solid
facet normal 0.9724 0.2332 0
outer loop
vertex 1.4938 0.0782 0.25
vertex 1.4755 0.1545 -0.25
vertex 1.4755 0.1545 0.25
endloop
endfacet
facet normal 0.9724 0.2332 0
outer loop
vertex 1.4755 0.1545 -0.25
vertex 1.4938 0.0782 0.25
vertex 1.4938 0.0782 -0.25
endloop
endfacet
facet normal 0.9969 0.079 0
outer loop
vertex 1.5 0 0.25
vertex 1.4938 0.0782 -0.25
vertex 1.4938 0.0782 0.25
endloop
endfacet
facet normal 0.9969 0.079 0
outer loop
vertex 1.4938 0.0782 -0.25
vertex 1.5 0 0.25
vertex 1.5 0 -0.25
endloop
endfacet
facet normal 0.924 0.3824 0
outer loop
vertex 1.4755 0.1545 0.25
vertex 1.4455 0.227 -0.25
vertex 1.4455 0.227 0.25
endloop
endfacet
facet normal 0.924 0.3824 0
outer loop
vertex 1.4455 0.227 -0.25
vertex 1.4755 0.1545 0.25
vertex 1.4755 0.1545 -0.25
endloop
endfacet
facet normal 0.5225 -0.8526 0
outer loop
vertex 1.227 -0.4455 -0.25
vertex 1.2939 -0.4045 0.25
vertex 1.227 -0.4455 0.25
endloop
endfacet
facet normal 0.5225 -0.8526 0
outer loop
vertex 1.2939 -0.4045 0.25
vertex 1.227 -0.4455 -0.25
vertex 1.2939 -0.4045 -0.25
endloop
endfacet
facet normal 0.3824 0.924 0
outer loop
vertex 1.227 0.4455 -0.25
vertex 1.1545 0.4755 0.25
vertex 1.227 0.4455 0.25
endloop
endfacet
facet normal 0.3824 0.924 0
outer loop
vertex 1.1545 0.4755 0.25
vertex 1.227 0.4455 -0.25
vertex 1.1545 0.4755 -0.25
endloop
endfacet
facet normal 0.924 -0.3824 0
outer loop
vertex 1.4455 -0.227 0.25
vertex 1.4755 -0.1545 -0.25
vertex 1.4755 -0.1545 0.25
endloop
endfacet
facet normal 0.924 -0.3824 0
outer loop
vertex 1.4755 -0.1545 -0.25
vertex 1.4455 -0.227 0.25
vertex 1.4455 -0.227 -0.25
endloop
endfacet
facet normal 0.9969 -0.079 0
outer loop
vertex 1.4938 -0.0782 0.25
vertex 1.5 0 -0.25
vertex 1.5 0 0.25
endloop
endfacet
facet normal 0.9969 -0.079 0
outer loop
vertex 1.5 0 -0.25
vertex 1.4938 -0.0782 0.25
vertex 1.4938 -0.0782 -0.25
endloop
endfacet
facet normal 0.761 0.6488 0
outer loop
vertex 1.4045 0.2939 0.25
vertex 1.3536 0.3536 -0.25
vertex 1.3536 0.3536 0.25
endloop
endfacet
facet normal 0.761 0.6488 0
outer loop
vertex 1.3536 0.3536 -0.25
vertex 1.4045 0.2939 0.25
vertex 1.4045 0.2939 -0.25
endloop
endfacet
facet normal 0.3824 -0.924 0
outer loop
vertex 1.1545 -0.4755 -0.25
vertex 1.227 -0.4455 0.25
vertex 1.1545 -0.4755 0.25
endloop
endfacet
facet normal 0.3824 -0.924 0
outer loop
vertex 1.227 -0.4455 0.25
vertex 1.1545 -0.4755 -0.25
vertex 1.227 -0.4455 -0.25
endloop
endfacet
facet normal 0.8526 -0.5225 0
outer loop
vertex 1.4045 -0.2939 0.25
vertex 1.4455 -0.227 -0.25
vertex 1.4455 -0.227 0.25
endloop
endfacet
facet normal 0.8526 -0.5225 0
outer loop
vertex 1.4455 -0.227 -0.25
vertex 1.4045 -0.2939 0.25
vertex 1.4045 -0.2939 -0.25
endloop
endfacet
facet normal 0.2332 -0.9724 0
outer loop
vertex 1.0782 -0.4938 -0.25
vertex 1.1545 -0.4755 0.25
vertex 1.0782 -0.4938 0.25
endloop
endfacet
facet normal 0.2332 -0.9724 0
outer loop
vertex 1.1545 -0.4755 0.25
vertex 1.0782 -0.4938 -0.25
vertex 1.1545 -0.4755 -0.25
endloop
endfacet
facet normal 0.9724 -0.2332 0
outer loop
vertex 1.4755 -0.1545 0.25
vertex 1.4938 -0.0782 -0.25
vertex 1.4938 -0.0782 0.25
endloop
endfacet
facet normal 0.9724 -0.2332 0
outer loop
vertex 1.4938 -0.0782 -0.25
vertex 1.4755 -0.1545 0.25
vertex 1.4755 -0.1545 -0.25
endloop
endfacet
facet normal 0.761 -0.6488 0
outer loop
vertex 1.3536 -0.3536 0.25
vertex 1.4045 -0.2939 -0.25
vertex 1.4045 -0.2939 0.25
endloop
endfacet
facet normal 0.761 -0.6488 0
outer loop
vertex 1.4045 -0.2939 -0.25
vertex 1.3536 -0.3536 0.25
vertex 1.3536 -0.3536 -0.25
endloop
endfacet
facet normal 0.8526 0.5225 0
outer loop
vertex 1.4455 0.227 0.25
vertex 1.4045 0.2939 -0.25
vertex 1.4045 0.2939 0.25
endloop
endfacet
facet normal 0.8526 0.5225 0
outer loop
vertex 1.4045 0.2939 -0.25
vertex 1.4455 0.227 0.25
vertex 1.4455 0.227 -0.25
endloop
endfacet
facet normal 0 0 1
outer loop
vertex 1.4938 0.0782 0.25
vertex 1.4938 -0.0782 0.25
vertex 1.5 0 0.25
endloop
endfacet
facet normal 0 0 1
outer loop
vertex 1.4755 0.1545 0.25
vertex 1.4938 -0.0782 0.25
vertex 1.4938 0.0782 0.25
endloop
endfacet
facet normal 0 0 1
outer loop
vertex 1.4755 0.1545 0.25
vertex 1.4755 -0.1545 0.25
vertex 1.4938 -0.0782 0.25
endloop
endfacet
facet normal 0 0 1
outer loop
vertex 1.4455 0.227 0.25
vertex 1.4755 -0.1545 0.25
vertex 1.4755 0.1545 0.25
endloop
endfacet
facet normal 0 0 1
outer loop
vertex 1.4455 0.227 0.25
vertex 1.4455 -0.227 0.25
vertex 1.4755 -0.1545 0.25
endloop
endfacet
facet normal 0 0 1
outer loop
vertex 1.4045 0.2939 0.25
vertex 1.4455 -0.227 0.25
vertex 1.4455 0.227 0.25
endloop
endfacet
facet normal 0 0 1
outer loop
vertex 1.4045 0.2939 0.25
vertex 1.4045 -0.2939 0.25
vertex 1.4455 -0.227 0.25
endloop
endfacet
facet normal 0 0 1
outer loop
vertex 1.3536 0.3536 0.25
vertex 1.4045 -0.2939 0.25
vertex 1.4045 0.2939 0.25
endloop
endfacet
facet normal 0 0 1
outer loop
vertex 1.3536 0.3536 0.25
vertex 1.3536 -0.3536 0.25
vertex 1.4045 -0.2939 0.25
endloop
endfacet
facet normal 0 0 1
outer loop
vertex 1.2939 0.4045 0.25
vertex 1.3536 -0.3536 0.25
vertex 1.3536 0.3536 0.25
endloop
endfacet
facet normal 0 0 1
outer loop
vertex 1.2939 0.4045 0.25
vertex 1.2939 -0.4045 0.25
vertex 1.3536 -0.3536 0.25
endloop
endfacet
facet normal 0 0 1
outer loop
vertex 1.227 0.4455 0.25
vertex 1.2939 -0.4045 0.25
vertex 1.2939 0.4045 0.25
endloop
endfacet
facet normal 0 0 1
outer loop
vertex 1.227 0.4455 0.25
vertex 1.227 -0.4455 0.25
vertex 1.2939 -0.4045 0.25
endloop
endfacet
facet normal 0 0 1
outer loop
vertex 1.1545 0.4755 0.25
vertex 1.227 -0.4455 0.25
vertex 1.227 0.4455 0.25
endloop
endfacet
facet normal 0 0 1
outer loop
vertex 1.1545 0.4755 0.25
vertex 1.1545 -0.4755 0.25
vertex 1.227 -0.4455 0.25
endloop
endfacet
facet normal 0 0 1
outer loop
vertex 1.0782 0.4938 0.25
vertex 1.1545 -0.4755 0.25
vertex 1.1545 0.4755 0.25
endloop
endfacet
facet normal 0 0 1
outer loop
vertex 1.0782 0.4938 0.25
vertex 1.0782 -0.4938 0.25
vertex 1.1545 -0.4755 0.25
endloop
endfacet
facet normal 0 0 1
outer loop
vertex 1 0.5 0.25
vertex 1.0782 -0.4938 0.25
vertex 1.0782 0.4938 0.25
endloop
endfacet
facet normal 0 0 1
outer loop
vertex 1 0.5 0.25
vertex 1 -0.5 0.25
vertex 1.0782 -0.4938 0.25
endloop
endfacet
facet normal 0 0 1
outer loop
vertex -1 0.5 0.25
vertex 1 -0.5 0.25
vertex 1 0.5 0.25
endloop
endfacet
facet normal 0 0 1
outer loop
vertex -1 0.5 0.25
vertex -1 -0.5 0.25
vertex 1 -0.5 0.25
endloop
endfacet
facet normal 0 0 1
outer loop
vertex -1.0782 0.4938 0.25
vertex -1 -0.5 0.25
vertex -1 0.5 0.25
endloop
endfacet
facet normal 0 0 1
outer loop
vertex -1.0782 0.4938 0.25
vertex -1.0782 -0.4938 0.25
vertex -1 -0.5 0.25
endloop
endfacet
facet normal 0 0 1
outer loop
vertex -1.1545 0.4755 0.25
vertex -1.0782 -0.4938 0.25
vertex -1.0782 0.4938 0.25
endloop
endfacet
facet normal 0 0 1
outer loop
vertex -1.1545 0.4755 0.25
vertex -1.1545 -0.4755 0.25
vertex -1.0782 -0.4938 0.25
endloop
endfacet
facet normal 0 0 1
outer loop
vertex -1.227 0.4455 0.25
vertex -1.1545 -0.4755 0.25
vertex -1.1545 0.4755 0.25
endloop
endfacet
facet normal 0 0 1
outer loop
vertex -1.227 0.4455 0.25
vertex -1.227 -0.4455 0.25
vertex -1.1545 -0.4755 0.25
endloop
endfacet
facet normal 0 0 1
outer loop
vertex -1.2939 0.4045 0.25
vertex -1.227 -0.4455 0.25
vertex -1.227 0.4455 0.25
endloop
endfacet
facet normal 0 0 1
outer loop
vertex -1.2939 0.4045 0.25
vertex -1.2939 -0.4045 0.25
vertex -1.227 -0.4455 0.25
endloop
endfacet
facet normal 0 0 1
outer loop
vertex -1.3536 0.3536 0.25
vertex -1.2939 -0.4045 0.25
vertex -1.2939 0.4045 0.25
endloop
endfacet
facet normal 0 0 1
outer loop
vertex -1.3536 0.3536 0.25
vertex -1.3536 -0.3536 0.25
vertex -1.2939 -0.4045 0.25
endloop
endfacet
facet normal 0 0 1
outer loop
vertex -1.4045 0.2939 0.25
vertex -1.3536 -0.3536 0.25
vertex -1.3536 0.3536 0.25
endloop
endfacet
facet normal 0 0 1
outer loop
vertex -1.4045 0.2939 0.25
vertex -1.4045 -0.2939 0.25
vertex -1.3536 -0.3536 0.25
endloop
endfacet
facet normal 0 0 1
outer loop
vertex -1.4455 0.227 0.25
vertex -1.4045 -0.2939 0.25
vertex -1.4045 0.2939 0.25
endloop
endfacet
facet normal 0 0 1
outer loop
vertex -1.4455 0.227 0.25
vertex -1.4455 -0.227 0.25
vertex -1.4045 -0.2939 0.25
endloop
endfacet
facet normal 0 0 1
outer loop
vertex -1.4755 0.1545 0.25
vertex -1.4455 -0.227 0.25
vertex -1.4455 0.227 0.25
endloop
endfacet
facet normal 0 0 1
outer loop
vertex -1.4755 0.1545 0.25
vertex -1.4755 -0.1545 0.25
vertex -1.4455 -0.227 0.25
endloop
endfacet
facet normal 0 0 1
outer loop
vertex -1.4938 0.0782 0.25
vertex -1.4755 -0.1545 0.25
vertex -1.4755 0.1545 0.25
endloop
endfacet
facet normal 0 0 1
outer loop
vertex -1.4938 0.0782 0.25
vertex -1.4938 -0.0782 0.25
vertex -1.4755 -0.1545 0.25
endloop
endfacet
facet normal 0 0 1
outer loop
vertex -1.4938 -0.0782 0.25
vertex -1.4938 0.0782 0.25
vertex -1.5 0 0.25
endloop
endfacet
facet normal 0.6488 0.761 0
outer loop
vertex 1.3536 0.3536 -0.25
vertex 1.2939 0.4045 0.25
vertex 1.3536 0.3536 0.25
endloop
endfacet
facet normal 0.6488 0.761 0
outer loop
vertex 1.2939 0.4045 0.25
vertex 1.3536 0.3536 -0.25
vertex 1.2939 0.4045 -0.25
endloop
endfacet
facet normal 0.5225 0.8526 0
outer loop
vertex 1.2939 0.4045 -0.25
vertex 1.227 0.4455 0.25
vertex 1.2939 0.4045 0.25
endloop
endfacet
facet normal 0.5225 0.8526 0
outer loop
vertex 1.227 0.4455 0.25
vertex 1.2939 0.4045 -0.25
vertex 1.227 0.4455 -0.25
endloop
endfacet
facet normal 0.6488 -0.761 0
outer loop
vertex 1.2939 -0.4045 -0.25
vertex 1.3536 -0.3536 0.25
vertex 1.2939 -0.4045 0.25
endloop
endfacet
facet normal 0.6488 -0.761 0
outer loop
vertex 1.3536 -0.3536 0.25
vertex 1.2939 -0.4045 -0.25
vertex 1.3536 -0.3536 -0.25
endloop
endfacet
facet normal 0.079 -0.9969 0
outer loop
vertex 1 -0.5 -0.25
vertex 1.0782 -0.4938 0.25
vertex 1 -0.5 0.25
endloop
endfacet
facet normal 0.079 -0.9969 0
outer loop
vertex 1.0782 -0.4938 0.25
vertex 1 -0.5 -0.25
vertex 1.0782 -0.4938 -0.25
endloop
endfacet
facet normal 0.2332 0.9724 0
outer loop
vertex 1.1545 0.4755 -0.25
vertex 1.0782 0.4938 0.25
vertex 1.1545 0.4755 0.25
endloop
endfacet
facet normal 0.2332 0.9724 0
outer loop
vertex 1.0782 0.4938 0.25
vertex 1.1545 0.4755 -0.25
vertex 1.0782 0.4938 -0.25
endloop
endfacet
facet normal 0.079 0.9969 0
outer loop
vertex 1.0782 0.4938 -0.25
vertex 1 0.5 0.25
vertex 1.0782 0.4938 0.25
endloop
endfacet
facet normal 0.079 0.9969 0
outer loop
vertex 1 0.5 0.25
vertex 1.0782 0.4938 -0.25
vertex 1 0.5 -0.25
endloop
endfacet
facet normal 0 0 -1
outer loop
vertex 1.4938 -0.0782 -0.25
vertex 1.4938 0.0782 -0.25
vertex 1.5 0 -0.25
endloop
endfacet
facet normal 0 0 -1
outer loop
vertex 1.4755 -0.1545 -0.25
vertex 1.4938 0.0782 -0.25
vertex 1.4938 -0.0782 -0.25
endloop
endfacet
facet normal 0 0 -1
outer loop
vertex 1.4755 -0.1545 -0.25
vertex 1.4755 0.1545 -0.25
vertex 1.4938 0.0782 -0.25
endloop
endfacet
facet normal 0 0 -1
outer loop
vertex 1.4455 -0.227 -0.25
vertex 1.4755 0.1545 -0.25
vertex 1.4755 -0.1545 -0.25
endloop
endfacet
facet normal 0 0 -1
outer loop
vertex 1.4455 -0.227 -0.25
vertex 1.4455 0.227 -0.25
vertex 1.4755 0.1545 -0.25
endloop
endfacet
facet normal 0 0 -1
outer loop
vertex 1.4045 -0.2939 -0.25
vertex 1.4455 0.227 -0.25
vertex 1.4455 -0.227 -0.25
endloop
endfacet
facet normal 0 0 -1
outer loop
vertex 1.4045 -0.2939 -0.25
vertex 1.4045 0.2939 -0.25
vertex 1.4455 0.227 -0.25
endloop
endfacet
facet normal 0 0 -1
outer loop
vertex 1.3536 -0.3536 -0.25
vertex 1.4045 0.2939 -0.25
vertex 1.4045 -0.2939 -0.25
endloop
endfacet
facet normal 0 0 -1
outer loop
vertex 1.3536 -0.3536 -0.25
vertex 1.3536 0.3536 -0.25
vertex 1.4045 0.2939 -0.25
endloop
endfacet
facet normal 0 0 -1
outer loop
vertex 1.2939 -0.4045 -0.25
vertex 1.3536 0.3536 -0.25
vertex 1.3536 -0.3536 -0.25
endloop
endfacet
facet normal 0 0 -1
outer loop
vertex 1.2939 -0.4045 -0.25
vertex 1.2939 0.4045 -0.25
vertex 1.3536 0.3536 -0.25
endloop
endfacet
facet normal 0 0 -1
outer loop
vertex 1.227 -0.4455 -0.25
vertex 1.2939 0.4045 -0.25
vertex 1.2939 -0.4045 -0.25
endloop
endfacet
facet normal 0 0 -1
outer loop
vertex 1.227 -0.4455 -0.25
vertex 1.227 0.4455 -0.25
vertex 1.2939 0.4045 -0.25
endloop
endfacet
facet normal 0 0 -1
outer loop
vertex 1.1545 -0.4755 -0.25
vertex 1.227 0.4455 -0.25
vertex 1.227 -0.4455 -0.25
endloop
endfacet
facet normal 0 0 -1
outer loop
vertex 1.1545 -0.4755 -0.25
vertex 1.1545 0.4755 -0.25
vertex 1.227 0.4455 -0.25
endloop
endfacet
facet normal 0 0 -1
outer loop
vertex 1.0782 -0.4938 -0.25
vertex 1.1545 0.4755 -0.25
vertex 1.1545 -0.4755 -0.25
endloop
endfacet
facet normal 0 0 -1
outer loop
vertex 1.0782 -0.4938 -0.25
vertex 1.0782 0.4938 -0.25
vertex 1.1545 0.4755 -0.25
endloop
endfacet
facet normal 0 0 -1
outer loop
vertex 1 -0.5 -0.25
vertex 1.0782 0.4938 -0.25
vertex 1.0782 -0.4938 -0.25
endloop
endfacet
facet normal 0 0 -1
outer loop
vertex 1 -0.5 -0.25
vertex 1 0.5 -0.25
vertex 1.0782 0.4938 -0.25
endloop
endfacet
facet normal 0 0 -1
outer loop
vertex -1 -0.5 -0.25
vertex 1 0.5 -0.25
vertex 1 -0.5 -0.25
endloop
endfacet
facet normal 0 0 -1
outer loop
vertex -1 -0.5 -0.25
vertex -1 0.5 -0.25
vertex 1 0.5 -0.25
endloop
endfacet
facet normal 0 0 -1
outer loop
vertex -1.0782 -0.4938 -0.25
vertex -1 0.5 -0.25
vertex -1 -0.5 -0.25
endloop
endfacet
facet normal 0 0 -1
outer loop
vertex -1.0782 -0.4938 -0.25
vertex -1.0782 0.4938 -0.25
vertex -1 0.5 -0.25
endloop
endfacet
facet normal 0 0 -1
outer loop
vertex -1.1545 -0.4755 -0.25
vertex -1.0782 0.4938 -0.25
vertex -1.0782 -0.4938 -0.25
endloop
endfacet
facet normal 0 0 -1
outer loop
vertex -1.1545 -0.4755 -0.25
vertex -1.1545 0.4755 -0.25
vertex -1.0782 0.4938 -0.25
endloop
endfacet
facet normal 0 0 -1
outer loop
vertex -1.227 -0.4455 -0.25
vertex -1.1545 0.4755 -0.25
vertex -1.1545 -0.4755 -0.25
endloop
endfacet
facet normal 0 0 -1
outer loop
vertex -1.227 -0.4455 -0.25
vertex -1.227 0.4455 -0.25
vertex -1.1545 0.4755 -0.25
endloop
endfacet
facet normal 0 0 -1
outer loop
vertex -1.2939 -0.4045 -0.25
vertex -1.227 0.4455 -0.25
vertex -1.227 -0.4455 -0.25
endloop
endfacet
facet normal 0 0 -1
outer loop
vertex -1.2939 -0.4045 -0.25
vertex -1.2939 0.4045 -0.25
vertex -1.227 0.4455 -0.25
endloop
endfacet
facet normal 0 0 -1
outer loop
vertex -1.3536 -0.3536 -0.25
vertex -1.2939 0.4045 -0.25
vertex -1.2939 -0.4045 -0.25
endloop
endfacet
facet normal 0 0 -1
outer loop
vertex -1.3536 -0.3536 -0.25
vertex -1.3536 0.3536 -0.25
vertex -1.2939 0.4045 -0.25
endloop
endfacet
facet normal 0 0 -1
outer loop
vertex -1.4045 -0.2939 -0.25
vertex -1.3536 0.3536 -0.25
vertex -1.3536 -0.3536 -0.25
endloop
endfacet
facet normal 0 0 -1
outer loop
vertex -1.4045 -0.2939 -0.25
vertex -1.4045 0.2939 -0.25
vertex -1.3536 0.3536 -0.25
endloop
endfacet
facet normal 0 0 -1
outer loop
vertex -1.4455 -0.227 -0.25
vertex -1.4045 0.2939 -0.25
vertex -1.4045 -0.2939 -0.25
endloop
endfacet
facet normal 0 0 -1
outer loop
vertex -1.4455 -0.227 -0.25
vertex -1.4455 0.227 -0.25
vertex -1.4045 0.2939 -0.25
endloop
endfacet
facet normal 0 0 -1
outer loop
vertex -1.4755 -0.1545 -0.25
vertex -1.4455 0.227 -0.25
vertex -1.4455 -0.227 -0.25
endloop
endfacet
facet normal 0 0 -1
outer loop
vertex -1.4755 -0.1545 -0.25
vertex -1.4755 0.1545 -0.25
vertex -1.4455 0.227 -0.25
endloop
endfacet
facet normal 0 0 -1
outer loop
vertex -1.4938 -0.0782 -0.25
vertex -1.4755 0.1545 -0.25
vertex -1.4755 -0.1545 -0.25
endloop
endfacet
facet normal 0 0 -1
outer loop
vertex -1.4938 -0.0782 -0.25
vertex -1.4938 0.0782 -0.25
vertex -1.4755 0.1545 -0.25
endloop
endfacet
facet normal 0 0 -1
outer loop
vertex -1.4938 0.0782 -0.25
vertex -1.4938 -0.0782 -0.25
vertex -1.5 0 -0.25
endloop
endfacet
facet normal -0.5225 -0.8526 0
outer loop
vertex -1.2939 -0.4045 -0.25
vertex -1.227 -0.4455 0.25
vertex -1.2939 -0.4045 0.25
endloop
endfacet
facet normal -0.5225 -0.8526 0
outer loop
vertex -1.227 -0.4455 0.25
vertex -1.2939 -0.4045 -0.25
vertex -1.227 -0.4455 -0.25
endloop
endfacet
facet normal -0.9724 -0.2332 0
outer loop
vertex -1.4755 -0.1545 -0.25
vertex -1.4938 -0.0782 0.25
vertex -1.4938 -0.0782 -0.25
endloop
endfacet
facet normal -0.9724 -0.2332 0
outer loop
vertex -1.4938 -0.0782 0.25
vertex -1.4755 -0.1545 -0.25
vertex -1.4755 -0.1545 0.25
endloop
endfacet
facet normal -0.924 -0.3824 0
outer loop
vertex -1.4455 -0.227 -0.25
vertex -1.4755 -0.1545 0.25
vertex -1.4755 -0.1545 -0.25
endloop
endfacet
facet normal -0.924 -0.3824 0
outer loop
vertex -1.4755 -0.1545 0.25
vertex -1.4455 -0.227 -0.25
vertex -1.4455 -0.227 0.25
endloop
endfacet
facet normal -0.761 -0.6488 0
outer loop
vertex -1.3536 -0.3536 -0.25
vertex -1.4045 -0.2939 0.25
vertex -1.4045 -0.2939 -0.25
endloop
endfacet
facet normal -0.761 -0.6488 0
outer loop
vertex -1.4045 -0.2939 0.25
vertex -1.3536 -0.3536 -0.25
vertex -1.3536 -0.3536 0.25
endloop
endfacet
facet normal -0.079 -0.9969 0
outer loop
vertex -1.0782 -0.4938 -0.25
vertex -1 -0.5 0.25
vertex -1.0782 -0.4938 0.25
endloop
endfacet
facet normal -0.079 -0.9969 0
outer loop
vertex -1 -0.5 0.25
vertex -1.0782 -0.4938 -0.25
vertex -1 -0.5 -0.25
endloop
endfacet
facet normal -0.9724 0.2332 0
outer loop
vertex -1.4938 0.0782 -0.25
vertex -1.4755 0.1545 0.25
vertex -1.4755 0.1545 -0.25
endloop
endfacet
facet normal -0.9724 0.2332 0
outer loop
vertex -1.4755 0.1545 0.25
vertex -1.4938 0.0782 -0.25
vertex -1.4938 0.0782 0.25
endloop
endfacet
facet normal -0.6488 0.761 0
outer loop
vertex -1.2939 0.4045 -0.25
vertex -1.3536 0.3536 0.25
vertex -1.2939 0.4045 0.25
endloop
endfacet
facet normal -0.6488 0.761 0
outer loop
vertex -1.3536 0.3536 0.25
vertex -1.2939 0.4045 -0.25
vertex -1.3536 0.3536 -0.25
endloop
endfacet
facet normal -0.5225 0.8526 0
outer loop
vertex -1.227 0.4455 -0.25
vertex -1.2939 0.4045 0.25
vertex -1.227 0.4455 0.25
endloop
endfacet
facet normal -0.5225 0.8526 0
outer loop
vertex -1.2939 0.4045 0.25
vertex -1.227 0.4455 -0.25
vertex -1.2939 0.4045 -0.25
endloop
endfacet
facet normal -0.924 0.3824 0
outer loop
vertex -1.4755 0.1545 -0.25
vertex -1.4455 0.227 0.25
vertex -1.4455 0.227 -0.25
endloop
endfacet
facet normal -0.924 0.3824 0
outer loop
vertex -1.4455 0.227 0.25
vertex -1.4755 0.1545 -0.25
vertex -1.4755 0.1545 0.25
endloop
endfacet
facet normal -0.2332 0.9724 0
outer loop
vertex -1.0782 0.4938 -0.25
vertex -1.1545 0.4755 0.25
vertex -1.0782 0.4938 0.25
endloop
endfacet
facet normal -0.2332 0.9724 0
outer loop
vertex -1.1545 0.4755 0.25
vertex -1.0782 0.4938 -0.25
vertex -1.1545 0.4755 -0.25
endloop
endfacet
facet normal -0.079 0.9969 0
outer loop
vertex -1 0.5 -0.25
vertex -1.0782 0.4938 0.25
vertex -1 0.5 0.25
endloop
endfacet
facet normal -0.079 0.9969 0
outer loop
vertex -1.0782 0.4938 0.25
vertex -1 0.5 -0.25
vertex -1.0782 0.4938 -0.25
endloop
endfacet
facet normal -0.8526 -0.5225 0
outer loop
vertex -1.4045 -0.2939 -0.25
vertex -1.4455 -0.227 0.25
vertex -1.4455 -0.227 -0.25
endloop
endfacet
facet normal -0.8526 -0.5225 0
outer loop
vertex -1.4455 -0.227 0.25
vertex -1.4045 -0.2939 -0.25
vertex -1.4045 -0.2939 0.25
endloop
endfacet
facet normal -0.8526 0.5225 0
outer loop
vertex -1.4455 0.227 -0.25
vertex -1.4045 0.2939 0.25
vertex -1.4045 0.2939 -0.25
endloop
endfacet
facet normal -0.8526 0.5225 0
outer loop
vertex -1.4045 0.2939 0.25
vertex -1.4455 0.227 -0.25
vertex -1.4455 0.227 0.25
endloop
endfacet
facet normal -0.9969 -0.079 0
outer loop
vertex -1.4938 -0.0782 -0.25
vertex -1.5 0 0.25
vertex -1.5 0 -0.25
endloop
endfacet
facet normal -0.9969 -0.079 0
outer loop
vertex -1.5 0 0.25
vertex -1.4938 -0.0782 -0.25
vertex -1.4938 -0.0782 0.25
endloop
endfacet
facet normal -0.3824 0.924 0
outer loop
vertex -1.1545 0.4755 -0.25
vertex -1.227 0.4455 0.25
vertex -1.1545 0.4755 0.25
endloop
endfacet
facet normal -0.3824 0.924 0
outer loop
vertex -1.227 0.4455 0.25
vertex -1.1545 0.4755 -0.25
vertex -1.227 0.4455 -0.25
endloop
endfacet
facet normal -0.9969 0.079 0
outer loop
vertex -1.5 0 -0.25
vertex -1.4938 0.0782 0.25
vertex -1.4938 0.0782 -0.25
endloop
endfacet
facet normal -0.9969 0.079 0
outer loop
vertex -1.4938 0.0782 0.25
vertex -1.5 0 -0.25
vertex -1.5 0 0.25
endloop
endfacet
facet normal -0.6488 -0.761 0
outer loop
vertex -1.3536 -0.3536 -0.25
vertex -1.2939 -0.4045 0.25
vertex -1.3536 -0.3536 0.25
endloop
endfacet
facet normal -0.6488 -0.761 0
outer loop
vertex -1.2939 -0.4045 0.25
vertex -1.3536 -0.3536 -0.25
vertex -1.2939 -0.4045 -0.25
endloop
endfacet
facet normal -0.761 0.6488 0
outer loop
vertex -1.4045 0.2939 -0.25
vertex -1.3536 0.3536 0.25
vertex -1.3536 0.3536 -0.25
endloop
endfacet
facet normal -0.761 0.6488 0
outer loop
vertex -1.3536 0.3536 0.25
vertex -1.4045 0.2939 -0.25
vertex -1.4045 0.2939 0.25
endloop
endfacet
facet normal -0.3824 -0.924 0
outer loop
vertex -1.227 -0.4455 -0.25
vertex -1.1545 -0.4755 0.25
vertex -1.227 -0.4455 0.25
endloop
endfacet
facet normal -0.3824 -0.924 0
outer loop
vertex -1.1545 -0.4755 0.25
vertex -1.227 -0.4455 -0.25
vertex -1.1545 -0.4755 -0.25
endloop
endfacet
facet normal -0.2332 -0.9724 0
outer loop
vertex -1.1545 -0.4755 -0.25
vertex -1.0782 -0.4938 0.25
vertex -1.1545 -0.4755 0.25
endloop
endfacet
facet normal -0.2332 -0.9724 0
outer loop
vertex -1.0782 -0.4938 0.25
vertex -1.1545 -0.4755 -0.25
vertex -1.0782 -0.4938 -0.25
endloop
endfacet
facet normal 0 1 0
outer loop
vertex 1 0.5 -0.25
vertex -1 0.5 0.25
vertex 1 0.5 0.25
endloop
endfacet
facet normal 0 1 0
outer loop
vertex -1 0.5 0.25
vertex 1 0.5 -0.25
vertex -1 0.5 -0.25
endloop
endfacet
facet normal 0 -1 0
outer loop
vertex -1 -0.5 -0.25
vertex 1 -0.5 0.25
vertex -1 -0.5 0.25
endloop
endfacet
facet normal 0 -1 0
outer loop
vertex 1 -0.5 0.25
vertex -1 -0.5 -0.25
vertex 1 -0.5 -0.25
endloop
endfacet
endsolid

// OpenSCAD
module Key(){

    Key_Lenght = 10;
    Key_Height = 10;
    Key_Width = 15;

    color("#a8b0b2")
    union(){
        translate([1,0,0])
        cylinder(0.5,0.5,0.5, $fn=40, center=true);

        translate([-1,0,0])
        cylinder(0.5,0.5,0.5, $fn=40, center=true);

        cube([2,1,0.5],center = true);
    }


}

Key();


// Written by Nicolì Angelo (Gengio) 2024: 
// MIT License

//Permission is hereby granted, free of charge, to any person obtaining a copy of this software and associated documentation files (the "Software"), to deal in the Software without restriction, including without limitation the rights to use, copy, modify, merge, publish, distribute, sublicense, and/or sell copies of the Software, and to permit persons to whom the Software is furnished to do so, subject to the following conditions:

//The above copyright notice and this permission notice shall be included in all copies or substantial portions of the Software.

//THE SOFTWARE IS PROVIDED "AS IS", WITHOUT WARRANTY OF ANY KIND, EXPRESS OR IMPLIED, INCLUDING BUT NOT LIMITED TO THE WARRANTIES OF MERCHANTABILITY, FITNESS FOR A PARTICULAR PURPOSE AND NONINFRINGEMENT. IN NO EVENT SHALL THE AUTHORS OR COPYRIGHT HOLDERS BE LIABLE FOR ANY CLAIM, DAMAGES OR OTHER LIABILITY, WHETHER IN AN ACTION OF CONTRACT, TORT OR OTHERWISE, ARISING FROM, OUT OF OR IN CONNECTION WITH THE SOFTWARE OR THE USE OR OTHER DEALINGS IN THE SOFTWARE.
